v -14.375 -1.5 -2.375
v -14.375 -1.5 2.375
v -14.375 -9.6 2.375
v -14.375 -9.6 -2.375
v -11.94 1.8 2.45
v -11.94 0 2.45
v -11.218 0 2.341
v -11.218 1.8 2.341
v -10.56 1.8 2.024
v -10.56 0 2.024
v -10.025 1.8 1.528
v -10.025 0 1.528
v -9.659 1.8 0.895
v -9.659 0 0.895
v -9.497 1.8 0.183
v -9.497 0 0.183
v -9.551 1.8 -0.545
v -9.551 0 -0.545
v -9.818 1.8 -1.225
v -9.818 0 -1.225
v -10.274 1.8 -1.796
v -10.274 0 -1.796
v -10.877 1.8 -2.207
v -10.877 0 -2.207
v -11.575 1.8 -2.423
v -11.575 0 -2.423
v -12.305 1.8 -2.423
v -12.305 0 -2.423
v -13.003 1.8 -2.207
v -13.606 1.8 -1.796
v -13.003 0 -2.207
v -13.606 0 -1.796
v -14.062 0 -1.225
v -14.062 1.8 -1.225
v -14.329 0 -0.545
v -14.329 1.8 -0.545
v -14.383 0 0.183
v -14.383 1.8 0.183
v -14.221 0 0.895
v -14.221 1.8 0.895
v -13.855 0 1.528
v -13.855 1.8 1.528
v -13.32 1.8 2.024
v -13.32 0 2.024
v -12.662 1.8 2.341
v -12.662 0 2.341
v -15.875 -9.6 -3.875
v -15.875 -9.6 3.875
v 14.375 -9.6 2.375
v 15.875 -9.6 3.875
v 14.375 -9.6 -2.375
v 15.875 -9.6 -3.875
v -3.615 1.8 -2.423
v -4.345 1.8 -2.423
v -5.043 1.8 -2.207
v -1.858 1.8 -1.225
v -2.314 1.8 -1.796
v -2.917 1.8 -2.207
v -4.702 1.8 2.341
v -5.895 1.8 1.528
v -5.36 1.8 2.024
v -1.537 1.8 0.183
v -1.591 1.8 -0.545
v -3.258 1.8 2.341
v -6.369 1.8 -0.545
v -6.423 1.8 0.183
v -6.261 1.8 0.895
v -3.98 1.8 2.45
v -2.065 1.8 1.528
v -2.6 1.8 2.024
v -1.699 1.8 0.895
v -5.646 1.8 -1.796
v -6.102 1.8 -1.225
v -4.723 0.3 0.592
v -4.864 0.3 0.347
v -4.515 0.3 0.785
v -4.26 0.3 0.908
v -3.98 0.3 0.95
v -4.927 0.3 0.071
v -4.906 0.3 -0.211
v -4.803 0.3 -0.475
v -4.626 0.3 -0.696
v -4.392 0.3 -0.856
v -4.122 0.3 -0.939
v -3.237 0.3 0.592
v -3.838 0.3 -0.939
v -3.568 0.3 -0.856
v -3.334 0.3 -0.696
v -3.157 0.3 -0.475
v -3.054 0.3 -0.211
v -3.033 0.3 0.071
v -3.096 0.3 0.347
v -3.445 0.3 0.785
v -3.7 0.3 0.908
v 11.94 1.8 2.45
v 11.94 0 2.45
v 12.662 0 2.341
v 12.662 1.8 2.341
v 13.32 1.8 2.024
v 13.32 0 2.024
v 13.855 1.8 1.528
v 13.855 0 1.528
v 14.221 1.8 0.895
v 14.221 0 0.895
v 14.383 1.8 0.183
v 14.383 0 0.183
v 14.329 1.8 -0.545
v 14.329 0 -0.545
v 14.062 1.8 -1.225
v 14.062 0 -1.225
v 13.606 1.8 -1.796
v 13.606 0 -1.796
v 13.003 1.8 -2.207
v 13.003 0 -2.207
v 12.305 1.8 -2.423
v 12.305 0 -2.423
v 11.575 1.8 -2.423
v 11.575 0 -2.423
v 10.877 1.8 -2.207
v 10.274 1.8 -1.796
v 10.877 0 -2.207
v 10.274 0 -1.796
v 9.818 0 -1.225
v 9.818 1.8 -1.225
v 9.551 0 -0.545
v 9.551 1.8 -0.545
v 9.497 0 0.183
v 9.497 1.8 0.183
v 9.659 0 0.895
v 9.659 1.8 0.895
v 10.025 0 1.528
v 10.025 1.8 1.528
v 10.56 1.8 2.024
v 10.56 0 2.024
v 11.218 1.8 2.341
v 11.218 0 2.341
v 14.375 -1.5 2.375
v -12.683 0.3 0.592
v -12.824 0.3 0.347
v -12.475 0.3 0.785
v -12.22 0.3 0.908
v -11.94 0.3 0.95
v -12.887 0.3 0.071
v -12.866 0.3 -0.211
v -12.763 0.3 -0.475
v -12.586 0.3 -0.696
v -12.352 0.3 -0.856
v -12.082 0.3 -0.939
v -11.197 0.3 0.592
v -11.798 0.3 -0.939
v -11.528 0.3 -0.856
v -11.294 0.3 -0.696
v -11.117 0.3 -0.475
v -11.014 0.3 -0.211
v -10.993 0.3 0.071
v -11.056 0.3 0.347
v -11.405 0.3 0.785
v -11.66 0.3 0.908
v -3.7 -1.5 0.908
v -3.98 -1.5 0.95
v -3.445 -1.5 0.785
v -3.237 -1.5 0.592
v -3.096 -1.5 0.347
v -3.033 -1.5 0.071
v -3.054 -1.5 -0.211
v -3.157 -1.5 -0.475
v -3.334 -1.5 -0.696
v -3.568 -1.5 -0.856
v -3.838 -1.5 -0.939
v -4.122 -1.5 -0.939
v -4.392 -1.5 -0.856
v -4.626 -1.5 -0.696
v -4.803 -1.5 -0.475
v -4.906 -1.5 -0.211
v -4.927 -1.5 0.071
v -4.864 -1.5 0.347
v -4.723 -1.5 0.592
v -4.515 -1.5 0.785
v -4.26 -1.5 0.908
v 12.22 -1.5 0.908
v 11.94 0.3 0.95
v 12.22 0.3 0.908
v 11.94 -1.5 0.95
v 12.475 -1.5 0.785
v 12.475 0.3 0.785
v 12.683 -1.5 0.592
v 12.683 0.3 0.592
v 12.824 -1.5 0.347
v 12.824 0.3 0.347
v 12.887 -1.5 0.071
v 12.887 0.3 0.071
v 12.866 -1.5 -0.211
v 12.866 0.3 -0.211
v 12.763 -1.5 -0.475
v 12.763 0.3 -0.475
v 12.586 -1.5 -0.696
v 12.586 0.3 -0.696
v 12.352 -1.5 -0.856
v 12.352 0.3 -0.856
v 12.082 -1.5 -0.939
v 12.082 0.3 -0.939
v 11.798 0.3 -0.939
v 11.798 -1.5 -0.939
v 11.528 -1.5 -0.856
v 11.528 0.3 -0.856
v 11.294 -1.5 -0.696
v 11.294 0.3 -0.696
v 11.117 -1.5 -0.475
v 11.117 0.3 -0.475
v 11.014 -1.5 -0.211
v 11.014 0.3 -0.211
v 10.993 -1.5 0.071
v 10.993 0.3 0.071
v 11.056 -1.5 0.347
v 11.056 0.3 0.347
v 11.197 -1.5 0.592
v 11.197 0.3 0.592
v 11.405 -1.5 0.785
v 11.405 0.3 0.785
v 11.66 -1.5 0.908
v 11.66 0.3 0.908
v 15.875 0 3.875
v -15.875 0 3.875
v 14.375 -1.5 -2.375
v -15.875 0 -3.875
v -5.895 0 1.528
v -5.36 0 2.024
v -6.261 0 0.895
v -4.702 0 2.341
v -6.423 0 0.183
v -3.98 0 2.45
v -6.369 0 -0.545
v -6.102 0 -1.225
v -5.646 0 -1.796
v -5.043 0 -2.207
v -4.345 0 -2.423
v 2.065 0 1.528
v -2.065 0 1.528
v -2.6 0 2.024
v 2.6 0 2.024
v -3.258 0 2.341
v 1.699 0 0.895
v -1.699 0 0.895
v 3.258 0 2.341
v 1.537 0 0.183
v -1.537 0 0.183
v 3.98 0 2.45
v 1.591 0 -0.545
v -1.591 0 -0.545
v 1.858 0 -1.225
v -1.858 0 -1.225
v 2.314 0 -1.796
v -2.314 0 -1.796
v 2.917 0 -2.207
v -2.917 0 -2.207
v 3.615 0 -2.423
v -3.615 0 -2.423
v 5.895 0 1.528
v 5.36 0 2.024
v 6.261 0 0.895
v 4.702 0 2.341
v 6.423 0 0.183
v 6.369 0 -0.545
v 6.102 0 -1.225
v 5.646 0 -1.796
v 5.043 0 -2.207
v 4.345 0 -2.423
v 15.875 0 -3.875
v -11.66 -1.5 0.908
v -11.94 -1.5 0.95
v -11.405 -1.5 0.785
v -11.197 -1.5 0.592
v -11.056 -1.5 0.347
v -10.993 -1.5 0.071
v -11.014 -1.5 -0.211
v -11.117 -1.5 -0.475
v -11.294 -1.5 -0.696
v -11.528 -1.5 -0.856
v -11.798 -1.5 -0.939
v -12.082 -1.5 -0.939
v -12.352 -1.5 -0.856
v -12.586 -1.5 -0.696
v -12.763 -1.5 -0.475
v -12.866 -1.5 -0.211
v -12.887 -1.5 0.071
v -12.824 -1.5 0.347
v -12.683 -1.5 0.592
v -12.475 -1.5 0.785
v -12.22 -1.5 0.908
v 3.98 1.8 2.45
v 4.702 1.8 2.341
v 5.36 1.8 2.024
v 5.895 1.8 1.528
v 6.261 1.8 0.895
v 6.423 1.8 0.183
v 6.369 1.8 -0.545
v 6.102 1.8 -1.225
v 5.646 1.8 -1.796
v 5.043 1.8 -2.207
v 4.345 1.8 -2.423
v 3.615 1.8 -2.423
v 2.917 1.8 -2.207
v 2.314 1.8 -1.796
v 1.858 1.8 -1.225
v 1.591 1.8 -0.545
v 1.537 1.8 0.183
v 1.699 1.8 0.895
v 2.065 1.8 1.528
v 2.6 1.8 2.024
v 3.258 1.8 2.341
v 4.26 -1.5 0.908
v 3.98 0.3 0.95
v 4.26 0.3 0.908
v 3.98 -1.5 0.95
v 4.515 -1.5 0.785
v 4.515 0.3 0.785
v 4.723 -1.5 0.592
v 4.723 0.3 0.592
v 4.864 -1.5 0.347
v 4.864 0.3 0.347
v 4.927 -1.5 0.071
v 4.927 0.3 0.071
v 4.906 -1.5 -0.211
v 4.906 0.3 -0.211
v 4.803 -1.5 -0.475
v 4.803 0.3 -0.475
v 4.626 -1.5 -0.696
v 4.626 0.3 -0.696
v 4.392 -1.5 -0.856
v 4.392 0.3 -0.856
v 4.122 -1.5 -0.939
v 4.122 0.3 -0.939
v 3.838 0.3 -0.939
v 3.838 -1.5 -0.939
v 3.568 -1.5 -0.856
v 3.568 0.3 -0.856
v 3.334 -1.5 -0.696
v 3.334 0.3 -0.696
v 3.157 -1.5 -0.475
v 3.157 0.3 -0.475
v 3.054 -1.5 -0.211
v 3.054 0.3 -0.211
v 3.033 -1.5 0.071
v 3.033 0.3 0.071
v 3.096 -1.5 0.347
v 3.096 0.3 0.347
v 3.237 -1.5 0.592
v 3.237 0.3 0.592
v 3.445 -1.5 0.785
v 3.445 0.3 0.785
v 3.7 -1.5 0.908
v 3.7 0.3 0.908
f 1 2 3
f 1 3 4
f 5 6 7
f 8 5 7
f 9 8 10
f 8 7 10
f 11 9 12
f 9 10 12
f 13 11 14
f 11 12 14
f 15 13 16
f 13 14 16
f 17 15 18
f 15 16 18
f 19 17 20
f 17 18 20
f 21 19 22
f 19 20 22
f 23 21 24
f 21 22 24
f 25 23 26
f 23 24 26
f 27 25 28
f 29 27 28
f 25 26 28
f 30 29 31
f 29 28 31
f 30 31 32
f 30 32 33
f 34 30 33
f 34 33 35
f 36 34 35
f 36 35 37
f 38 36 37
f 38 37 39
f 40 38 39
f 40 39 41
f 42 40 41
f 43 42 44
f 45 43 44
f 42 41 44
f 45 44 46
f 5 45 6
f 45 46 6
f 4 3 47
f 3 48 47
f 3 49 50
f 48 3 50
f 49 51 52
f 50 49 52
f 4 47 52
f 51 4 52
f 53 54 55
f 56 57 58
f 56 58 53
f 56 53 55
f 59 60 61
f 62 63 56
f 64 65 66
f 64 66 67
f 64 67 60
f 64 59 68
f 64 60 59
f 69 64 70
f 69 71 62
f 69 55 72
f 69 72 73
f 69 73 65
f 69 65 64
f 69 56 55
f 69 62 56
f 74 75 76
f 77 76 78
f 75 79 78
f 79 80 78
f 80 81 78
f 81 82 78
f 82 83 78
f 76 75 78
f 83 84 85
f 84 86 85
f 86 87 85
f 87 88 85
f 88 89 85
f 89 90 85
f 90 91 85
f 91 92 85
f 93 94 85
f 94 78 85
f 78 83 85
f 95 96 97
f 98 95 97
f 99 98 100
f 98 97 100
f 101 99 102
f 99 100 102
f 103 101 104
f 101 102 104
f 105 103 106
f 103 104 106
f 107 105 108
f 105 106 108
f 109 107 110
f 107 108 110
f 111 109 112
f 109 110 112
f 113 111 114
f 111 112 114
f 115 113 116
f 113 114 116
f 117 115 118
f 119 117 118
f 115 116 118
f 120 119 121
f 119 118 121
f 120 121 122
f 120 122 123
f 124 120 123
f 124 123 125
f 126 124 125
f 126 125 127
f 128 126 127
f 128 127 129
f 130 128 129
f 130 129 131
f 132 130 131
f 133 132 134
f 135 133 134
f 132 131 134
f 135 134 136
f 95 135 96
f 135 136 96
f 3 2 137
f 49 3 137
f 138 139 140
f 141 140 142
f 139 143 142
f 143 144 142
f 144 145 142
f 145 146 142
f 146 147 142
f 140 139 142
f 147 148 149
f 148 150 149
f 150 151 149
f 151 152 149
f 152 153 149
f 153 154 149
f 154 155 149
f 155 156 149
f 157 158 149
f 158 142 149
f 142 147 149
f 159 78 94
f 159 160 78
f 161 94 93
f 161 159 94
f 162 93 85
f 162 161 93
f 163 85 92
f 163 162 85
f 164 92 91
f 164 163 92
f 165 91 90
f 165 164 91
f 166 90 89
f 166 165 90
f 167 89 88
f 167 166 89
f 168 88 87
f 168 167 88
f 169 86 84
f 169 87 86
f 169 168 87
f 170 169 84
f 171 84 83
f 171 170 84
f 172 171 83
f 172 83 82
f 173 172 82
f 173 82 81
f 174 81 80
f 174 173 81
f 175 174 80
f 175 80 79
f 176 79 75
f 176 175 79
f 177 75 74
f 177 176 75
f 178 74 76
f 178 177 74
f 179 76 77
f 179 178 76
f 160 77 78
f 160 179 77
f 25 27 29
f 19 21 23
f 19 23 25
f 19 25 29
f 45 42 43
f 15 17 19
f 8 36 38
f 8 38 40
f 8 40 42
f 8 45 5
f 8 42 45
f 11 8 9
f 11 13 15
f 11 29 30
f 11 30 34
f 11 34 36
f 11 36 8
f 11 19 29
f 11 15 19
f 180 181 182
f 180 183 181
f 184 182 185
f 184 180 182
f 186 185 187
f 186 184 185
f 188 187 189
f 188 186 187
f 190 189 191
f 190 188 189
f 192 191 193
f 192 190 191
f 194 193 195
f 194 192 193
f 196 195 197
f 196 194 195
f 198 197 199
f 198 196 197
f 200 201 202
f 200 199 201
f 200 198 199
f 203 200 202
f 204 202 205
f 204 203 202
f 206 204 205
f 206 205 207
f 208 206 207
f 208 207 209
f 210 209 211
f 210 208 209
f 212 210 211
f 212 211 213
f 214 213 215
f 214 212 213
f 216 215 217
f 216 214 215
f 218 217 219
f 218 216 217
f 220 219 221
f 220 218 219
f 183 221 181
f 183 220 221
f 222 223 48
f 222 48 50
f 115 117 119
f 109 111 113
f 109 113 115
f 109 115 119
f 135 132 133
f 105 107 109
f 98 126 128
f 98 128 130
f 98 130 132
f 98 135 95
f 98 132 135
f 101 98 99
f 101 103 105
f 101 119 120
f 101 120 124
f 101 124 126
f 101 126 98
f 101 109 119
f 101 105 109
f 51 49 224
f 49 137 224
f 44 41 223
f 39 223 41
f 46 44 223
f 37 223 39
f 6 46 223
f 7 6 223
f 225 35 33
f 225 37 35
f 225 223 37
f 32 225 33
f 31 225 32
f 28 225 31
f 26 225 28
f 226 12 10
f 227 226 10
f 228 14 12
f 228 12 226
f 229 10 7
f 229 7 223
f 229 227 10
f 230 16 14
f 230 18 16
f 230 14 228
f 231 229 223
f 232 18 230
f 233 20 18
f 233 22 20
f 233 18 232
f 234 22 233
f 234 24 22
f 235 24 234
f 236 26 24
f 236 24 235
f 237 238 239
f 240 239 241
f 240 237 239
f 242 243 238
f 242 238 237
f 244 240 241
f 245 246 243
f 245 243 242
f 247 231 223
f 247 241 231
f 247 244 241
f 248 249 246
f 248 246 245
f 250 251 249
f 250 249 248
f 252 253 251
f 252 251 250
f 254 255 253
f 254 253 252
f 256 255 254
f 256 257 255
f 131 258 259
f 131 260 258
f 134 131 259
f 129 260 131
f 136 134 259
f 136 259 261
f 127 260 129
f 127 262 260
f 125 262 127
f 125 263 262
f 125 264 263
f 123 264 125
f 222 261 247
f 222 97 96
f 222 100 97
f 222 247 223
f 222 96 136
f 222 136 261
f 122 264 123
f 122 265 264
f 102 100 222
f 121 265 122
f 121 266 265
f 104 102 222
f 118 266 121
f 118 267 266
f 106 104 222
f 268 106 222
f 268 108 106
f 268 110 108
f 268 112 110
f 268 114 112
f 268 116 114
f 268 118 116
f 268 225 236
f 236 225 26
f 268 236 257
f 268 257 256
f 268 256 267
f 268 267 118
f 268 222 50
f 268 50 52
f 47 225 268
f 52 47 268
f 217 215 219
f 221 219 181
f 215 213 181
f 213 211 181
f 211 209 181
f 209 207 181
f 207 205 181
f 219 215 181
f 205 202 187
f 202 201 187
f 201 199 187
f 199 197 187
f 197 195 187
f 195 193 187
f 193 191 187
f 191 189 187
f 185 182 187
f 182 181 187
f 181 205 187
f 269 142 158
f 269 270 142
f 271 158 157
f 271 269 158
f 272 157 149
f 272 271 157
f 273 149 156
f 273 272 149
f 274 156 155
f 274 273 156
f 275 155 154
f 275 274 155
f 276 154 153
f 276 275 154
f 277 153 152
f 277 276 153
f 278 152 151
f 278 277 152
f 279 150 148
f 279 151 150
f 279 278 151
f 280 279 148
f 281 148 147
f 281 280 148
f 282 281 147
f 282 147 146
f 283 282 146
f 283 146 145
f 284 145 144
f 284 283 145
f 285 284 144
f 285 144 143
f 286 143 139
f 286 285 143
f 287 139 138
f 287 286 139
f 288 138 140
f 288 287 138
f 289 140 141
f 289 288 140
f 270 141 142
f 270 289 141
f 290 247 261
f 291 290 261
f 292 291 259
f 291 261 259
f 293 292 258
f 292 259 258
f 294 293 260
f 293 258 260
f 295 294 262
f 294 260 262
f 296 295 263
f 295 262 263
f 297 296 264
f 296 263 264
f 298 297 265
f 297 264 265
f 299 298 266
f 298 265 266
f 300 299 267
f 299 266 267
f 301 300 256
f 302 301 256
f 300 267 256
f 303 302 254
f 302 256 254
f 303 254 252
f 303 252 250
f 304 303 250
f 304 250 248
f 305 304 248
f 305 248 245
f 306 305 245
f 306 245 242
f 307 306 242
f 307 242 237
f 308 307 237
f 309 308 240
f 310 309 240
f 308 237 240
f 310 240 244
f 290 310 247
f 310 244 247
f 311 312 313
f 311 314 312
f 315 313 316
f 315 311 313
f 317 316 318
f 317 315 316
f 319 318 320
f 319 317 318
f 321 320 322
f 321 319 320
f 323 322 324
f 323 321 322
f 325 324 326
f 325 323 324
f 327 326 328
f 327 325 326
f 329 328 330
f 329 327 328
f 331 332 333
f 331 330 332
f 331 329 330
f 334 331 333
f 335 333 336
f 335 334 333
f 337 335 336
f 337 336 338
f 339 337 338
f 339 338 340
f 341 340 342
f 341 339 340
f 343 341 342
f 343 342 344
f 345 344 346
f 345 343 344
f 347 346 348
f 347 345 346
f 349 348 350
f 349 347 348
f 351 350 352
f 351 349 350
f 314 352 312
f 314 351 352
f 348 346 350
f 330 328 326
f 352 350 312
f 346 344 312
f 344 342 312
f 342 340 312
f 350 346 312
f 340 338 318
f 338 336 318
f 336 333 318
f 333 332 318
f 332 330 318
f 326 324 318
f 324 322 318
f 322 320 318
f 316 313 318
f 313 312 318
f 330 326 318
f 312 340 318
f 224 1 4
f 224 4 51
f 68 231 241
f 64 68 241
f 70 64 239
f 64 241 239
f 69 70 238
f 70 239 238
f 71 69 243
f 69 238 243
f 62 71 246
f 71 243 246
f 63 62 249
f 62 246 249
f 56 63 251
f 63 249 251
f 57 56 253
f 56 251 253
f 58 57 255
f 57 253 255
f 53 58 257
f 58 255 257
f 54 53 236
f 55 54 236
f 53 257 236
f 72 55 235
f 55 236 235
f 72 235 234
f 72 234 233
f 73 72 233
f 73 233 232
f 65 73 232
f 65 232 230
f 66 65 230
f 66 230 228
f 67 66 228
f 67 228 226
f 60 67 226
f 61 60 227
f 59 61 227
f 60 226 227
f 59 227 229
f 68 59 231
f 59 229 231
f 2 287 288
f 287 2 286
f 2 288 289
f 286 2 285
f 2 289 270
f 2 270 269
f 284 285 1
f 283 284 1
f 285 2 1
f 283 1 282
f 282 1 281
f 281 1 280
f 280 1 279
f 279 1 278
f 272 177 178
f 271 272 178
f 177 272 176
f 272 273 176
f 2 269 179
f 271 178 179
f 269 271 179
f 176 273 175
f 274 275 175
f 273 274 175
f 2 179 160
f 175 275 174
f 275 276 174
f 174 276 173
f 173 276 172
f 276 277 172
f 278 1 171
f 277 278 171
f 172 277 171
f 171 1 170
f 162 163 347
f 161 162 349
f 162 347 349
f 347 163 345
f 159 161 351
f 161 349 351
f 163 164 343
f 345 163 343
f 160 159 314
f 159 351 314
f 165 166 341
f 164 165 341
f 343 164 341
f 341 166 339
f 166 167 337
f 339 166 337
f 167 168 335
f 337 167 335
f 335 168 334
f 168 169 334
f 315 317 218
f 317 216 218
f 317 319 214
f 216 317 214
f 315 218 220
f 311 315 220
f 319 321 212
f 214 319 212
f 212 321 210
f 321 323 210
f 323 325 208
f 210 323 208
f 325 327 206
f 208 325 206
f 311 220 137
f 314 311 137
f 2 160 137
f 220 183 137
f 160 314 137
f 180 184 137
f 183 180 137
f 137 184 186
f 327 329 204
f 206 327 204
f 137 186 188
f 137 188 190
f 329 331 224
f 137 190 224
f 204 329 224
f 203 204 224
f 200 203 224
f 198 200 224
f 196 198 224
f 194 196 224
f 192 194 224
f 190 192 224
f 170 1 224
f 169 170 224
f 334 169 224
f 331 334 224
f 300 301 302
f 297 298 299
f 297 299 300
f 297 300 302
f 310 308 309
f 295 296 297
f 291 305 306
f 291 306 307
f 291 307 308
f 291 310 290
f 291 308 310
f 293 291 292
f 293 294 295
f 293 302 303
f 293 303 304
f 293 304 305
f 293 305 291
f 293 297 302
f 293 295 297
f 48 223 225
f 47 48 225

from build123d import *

# Parameters (mm, degrees)
SKETCH1_W           = 31.75
SKETCH1_H           = 7.75
BOSS_EXTRUDE1_DEPTH = 9.6
SKETCH2_R           = 2.45
BOSS_EXTRUDE2_DEPTH = 1.8
SHELL1_T            = -1.5


with BuildPart() as part:
    # Sketch1 → Boss-Extrude1 (new body)
    with BuildSketch(Plane(origin=(0, 0, 0), x_dir=(1, 0, 0), z_dir=(0, 1, 0))):
        Rectangle(SKETCH1_W, SKETCH1_H)
    extrude(amount=-BOSS_EXTRUDE1_DEPTH)

    # Sketch2 → Boss-Extrude2 (add)
    with BuildSketch(Plane(origin=(0, 0, 0), x_dir=(1, 0, 0), z_dir=(0, 1, 0))):
        with Locations(Location((-11.94, 0, 0), (0, 0, 270))):
            Circle(SKETCH2_R)
        with Locations(Location((-3.98, 0, 0), (0, 0, 270))):
            Circle(SKETCH2_R)
        with Locations(Location((3.98, 0, 0), (0, 0, 270))):
            Circle(SKETCH2_R)
        with Locations(Location((11.94, 0, 0), (0, 0, 270))):
            Circle(SKETCH2_R)
    extrude(amount=BOSS_EXTRUDE2_DEPTH)

    # Shell1
    shell1_openings = [part.faces().sort_by_distance(p)[0] for p in [
        (0, -9.6, 0),
    ]]
    offset(amount=SHELL1_T, openings=shell1_openings, kind=Kind.INTERSECTION)


solid = part.part
